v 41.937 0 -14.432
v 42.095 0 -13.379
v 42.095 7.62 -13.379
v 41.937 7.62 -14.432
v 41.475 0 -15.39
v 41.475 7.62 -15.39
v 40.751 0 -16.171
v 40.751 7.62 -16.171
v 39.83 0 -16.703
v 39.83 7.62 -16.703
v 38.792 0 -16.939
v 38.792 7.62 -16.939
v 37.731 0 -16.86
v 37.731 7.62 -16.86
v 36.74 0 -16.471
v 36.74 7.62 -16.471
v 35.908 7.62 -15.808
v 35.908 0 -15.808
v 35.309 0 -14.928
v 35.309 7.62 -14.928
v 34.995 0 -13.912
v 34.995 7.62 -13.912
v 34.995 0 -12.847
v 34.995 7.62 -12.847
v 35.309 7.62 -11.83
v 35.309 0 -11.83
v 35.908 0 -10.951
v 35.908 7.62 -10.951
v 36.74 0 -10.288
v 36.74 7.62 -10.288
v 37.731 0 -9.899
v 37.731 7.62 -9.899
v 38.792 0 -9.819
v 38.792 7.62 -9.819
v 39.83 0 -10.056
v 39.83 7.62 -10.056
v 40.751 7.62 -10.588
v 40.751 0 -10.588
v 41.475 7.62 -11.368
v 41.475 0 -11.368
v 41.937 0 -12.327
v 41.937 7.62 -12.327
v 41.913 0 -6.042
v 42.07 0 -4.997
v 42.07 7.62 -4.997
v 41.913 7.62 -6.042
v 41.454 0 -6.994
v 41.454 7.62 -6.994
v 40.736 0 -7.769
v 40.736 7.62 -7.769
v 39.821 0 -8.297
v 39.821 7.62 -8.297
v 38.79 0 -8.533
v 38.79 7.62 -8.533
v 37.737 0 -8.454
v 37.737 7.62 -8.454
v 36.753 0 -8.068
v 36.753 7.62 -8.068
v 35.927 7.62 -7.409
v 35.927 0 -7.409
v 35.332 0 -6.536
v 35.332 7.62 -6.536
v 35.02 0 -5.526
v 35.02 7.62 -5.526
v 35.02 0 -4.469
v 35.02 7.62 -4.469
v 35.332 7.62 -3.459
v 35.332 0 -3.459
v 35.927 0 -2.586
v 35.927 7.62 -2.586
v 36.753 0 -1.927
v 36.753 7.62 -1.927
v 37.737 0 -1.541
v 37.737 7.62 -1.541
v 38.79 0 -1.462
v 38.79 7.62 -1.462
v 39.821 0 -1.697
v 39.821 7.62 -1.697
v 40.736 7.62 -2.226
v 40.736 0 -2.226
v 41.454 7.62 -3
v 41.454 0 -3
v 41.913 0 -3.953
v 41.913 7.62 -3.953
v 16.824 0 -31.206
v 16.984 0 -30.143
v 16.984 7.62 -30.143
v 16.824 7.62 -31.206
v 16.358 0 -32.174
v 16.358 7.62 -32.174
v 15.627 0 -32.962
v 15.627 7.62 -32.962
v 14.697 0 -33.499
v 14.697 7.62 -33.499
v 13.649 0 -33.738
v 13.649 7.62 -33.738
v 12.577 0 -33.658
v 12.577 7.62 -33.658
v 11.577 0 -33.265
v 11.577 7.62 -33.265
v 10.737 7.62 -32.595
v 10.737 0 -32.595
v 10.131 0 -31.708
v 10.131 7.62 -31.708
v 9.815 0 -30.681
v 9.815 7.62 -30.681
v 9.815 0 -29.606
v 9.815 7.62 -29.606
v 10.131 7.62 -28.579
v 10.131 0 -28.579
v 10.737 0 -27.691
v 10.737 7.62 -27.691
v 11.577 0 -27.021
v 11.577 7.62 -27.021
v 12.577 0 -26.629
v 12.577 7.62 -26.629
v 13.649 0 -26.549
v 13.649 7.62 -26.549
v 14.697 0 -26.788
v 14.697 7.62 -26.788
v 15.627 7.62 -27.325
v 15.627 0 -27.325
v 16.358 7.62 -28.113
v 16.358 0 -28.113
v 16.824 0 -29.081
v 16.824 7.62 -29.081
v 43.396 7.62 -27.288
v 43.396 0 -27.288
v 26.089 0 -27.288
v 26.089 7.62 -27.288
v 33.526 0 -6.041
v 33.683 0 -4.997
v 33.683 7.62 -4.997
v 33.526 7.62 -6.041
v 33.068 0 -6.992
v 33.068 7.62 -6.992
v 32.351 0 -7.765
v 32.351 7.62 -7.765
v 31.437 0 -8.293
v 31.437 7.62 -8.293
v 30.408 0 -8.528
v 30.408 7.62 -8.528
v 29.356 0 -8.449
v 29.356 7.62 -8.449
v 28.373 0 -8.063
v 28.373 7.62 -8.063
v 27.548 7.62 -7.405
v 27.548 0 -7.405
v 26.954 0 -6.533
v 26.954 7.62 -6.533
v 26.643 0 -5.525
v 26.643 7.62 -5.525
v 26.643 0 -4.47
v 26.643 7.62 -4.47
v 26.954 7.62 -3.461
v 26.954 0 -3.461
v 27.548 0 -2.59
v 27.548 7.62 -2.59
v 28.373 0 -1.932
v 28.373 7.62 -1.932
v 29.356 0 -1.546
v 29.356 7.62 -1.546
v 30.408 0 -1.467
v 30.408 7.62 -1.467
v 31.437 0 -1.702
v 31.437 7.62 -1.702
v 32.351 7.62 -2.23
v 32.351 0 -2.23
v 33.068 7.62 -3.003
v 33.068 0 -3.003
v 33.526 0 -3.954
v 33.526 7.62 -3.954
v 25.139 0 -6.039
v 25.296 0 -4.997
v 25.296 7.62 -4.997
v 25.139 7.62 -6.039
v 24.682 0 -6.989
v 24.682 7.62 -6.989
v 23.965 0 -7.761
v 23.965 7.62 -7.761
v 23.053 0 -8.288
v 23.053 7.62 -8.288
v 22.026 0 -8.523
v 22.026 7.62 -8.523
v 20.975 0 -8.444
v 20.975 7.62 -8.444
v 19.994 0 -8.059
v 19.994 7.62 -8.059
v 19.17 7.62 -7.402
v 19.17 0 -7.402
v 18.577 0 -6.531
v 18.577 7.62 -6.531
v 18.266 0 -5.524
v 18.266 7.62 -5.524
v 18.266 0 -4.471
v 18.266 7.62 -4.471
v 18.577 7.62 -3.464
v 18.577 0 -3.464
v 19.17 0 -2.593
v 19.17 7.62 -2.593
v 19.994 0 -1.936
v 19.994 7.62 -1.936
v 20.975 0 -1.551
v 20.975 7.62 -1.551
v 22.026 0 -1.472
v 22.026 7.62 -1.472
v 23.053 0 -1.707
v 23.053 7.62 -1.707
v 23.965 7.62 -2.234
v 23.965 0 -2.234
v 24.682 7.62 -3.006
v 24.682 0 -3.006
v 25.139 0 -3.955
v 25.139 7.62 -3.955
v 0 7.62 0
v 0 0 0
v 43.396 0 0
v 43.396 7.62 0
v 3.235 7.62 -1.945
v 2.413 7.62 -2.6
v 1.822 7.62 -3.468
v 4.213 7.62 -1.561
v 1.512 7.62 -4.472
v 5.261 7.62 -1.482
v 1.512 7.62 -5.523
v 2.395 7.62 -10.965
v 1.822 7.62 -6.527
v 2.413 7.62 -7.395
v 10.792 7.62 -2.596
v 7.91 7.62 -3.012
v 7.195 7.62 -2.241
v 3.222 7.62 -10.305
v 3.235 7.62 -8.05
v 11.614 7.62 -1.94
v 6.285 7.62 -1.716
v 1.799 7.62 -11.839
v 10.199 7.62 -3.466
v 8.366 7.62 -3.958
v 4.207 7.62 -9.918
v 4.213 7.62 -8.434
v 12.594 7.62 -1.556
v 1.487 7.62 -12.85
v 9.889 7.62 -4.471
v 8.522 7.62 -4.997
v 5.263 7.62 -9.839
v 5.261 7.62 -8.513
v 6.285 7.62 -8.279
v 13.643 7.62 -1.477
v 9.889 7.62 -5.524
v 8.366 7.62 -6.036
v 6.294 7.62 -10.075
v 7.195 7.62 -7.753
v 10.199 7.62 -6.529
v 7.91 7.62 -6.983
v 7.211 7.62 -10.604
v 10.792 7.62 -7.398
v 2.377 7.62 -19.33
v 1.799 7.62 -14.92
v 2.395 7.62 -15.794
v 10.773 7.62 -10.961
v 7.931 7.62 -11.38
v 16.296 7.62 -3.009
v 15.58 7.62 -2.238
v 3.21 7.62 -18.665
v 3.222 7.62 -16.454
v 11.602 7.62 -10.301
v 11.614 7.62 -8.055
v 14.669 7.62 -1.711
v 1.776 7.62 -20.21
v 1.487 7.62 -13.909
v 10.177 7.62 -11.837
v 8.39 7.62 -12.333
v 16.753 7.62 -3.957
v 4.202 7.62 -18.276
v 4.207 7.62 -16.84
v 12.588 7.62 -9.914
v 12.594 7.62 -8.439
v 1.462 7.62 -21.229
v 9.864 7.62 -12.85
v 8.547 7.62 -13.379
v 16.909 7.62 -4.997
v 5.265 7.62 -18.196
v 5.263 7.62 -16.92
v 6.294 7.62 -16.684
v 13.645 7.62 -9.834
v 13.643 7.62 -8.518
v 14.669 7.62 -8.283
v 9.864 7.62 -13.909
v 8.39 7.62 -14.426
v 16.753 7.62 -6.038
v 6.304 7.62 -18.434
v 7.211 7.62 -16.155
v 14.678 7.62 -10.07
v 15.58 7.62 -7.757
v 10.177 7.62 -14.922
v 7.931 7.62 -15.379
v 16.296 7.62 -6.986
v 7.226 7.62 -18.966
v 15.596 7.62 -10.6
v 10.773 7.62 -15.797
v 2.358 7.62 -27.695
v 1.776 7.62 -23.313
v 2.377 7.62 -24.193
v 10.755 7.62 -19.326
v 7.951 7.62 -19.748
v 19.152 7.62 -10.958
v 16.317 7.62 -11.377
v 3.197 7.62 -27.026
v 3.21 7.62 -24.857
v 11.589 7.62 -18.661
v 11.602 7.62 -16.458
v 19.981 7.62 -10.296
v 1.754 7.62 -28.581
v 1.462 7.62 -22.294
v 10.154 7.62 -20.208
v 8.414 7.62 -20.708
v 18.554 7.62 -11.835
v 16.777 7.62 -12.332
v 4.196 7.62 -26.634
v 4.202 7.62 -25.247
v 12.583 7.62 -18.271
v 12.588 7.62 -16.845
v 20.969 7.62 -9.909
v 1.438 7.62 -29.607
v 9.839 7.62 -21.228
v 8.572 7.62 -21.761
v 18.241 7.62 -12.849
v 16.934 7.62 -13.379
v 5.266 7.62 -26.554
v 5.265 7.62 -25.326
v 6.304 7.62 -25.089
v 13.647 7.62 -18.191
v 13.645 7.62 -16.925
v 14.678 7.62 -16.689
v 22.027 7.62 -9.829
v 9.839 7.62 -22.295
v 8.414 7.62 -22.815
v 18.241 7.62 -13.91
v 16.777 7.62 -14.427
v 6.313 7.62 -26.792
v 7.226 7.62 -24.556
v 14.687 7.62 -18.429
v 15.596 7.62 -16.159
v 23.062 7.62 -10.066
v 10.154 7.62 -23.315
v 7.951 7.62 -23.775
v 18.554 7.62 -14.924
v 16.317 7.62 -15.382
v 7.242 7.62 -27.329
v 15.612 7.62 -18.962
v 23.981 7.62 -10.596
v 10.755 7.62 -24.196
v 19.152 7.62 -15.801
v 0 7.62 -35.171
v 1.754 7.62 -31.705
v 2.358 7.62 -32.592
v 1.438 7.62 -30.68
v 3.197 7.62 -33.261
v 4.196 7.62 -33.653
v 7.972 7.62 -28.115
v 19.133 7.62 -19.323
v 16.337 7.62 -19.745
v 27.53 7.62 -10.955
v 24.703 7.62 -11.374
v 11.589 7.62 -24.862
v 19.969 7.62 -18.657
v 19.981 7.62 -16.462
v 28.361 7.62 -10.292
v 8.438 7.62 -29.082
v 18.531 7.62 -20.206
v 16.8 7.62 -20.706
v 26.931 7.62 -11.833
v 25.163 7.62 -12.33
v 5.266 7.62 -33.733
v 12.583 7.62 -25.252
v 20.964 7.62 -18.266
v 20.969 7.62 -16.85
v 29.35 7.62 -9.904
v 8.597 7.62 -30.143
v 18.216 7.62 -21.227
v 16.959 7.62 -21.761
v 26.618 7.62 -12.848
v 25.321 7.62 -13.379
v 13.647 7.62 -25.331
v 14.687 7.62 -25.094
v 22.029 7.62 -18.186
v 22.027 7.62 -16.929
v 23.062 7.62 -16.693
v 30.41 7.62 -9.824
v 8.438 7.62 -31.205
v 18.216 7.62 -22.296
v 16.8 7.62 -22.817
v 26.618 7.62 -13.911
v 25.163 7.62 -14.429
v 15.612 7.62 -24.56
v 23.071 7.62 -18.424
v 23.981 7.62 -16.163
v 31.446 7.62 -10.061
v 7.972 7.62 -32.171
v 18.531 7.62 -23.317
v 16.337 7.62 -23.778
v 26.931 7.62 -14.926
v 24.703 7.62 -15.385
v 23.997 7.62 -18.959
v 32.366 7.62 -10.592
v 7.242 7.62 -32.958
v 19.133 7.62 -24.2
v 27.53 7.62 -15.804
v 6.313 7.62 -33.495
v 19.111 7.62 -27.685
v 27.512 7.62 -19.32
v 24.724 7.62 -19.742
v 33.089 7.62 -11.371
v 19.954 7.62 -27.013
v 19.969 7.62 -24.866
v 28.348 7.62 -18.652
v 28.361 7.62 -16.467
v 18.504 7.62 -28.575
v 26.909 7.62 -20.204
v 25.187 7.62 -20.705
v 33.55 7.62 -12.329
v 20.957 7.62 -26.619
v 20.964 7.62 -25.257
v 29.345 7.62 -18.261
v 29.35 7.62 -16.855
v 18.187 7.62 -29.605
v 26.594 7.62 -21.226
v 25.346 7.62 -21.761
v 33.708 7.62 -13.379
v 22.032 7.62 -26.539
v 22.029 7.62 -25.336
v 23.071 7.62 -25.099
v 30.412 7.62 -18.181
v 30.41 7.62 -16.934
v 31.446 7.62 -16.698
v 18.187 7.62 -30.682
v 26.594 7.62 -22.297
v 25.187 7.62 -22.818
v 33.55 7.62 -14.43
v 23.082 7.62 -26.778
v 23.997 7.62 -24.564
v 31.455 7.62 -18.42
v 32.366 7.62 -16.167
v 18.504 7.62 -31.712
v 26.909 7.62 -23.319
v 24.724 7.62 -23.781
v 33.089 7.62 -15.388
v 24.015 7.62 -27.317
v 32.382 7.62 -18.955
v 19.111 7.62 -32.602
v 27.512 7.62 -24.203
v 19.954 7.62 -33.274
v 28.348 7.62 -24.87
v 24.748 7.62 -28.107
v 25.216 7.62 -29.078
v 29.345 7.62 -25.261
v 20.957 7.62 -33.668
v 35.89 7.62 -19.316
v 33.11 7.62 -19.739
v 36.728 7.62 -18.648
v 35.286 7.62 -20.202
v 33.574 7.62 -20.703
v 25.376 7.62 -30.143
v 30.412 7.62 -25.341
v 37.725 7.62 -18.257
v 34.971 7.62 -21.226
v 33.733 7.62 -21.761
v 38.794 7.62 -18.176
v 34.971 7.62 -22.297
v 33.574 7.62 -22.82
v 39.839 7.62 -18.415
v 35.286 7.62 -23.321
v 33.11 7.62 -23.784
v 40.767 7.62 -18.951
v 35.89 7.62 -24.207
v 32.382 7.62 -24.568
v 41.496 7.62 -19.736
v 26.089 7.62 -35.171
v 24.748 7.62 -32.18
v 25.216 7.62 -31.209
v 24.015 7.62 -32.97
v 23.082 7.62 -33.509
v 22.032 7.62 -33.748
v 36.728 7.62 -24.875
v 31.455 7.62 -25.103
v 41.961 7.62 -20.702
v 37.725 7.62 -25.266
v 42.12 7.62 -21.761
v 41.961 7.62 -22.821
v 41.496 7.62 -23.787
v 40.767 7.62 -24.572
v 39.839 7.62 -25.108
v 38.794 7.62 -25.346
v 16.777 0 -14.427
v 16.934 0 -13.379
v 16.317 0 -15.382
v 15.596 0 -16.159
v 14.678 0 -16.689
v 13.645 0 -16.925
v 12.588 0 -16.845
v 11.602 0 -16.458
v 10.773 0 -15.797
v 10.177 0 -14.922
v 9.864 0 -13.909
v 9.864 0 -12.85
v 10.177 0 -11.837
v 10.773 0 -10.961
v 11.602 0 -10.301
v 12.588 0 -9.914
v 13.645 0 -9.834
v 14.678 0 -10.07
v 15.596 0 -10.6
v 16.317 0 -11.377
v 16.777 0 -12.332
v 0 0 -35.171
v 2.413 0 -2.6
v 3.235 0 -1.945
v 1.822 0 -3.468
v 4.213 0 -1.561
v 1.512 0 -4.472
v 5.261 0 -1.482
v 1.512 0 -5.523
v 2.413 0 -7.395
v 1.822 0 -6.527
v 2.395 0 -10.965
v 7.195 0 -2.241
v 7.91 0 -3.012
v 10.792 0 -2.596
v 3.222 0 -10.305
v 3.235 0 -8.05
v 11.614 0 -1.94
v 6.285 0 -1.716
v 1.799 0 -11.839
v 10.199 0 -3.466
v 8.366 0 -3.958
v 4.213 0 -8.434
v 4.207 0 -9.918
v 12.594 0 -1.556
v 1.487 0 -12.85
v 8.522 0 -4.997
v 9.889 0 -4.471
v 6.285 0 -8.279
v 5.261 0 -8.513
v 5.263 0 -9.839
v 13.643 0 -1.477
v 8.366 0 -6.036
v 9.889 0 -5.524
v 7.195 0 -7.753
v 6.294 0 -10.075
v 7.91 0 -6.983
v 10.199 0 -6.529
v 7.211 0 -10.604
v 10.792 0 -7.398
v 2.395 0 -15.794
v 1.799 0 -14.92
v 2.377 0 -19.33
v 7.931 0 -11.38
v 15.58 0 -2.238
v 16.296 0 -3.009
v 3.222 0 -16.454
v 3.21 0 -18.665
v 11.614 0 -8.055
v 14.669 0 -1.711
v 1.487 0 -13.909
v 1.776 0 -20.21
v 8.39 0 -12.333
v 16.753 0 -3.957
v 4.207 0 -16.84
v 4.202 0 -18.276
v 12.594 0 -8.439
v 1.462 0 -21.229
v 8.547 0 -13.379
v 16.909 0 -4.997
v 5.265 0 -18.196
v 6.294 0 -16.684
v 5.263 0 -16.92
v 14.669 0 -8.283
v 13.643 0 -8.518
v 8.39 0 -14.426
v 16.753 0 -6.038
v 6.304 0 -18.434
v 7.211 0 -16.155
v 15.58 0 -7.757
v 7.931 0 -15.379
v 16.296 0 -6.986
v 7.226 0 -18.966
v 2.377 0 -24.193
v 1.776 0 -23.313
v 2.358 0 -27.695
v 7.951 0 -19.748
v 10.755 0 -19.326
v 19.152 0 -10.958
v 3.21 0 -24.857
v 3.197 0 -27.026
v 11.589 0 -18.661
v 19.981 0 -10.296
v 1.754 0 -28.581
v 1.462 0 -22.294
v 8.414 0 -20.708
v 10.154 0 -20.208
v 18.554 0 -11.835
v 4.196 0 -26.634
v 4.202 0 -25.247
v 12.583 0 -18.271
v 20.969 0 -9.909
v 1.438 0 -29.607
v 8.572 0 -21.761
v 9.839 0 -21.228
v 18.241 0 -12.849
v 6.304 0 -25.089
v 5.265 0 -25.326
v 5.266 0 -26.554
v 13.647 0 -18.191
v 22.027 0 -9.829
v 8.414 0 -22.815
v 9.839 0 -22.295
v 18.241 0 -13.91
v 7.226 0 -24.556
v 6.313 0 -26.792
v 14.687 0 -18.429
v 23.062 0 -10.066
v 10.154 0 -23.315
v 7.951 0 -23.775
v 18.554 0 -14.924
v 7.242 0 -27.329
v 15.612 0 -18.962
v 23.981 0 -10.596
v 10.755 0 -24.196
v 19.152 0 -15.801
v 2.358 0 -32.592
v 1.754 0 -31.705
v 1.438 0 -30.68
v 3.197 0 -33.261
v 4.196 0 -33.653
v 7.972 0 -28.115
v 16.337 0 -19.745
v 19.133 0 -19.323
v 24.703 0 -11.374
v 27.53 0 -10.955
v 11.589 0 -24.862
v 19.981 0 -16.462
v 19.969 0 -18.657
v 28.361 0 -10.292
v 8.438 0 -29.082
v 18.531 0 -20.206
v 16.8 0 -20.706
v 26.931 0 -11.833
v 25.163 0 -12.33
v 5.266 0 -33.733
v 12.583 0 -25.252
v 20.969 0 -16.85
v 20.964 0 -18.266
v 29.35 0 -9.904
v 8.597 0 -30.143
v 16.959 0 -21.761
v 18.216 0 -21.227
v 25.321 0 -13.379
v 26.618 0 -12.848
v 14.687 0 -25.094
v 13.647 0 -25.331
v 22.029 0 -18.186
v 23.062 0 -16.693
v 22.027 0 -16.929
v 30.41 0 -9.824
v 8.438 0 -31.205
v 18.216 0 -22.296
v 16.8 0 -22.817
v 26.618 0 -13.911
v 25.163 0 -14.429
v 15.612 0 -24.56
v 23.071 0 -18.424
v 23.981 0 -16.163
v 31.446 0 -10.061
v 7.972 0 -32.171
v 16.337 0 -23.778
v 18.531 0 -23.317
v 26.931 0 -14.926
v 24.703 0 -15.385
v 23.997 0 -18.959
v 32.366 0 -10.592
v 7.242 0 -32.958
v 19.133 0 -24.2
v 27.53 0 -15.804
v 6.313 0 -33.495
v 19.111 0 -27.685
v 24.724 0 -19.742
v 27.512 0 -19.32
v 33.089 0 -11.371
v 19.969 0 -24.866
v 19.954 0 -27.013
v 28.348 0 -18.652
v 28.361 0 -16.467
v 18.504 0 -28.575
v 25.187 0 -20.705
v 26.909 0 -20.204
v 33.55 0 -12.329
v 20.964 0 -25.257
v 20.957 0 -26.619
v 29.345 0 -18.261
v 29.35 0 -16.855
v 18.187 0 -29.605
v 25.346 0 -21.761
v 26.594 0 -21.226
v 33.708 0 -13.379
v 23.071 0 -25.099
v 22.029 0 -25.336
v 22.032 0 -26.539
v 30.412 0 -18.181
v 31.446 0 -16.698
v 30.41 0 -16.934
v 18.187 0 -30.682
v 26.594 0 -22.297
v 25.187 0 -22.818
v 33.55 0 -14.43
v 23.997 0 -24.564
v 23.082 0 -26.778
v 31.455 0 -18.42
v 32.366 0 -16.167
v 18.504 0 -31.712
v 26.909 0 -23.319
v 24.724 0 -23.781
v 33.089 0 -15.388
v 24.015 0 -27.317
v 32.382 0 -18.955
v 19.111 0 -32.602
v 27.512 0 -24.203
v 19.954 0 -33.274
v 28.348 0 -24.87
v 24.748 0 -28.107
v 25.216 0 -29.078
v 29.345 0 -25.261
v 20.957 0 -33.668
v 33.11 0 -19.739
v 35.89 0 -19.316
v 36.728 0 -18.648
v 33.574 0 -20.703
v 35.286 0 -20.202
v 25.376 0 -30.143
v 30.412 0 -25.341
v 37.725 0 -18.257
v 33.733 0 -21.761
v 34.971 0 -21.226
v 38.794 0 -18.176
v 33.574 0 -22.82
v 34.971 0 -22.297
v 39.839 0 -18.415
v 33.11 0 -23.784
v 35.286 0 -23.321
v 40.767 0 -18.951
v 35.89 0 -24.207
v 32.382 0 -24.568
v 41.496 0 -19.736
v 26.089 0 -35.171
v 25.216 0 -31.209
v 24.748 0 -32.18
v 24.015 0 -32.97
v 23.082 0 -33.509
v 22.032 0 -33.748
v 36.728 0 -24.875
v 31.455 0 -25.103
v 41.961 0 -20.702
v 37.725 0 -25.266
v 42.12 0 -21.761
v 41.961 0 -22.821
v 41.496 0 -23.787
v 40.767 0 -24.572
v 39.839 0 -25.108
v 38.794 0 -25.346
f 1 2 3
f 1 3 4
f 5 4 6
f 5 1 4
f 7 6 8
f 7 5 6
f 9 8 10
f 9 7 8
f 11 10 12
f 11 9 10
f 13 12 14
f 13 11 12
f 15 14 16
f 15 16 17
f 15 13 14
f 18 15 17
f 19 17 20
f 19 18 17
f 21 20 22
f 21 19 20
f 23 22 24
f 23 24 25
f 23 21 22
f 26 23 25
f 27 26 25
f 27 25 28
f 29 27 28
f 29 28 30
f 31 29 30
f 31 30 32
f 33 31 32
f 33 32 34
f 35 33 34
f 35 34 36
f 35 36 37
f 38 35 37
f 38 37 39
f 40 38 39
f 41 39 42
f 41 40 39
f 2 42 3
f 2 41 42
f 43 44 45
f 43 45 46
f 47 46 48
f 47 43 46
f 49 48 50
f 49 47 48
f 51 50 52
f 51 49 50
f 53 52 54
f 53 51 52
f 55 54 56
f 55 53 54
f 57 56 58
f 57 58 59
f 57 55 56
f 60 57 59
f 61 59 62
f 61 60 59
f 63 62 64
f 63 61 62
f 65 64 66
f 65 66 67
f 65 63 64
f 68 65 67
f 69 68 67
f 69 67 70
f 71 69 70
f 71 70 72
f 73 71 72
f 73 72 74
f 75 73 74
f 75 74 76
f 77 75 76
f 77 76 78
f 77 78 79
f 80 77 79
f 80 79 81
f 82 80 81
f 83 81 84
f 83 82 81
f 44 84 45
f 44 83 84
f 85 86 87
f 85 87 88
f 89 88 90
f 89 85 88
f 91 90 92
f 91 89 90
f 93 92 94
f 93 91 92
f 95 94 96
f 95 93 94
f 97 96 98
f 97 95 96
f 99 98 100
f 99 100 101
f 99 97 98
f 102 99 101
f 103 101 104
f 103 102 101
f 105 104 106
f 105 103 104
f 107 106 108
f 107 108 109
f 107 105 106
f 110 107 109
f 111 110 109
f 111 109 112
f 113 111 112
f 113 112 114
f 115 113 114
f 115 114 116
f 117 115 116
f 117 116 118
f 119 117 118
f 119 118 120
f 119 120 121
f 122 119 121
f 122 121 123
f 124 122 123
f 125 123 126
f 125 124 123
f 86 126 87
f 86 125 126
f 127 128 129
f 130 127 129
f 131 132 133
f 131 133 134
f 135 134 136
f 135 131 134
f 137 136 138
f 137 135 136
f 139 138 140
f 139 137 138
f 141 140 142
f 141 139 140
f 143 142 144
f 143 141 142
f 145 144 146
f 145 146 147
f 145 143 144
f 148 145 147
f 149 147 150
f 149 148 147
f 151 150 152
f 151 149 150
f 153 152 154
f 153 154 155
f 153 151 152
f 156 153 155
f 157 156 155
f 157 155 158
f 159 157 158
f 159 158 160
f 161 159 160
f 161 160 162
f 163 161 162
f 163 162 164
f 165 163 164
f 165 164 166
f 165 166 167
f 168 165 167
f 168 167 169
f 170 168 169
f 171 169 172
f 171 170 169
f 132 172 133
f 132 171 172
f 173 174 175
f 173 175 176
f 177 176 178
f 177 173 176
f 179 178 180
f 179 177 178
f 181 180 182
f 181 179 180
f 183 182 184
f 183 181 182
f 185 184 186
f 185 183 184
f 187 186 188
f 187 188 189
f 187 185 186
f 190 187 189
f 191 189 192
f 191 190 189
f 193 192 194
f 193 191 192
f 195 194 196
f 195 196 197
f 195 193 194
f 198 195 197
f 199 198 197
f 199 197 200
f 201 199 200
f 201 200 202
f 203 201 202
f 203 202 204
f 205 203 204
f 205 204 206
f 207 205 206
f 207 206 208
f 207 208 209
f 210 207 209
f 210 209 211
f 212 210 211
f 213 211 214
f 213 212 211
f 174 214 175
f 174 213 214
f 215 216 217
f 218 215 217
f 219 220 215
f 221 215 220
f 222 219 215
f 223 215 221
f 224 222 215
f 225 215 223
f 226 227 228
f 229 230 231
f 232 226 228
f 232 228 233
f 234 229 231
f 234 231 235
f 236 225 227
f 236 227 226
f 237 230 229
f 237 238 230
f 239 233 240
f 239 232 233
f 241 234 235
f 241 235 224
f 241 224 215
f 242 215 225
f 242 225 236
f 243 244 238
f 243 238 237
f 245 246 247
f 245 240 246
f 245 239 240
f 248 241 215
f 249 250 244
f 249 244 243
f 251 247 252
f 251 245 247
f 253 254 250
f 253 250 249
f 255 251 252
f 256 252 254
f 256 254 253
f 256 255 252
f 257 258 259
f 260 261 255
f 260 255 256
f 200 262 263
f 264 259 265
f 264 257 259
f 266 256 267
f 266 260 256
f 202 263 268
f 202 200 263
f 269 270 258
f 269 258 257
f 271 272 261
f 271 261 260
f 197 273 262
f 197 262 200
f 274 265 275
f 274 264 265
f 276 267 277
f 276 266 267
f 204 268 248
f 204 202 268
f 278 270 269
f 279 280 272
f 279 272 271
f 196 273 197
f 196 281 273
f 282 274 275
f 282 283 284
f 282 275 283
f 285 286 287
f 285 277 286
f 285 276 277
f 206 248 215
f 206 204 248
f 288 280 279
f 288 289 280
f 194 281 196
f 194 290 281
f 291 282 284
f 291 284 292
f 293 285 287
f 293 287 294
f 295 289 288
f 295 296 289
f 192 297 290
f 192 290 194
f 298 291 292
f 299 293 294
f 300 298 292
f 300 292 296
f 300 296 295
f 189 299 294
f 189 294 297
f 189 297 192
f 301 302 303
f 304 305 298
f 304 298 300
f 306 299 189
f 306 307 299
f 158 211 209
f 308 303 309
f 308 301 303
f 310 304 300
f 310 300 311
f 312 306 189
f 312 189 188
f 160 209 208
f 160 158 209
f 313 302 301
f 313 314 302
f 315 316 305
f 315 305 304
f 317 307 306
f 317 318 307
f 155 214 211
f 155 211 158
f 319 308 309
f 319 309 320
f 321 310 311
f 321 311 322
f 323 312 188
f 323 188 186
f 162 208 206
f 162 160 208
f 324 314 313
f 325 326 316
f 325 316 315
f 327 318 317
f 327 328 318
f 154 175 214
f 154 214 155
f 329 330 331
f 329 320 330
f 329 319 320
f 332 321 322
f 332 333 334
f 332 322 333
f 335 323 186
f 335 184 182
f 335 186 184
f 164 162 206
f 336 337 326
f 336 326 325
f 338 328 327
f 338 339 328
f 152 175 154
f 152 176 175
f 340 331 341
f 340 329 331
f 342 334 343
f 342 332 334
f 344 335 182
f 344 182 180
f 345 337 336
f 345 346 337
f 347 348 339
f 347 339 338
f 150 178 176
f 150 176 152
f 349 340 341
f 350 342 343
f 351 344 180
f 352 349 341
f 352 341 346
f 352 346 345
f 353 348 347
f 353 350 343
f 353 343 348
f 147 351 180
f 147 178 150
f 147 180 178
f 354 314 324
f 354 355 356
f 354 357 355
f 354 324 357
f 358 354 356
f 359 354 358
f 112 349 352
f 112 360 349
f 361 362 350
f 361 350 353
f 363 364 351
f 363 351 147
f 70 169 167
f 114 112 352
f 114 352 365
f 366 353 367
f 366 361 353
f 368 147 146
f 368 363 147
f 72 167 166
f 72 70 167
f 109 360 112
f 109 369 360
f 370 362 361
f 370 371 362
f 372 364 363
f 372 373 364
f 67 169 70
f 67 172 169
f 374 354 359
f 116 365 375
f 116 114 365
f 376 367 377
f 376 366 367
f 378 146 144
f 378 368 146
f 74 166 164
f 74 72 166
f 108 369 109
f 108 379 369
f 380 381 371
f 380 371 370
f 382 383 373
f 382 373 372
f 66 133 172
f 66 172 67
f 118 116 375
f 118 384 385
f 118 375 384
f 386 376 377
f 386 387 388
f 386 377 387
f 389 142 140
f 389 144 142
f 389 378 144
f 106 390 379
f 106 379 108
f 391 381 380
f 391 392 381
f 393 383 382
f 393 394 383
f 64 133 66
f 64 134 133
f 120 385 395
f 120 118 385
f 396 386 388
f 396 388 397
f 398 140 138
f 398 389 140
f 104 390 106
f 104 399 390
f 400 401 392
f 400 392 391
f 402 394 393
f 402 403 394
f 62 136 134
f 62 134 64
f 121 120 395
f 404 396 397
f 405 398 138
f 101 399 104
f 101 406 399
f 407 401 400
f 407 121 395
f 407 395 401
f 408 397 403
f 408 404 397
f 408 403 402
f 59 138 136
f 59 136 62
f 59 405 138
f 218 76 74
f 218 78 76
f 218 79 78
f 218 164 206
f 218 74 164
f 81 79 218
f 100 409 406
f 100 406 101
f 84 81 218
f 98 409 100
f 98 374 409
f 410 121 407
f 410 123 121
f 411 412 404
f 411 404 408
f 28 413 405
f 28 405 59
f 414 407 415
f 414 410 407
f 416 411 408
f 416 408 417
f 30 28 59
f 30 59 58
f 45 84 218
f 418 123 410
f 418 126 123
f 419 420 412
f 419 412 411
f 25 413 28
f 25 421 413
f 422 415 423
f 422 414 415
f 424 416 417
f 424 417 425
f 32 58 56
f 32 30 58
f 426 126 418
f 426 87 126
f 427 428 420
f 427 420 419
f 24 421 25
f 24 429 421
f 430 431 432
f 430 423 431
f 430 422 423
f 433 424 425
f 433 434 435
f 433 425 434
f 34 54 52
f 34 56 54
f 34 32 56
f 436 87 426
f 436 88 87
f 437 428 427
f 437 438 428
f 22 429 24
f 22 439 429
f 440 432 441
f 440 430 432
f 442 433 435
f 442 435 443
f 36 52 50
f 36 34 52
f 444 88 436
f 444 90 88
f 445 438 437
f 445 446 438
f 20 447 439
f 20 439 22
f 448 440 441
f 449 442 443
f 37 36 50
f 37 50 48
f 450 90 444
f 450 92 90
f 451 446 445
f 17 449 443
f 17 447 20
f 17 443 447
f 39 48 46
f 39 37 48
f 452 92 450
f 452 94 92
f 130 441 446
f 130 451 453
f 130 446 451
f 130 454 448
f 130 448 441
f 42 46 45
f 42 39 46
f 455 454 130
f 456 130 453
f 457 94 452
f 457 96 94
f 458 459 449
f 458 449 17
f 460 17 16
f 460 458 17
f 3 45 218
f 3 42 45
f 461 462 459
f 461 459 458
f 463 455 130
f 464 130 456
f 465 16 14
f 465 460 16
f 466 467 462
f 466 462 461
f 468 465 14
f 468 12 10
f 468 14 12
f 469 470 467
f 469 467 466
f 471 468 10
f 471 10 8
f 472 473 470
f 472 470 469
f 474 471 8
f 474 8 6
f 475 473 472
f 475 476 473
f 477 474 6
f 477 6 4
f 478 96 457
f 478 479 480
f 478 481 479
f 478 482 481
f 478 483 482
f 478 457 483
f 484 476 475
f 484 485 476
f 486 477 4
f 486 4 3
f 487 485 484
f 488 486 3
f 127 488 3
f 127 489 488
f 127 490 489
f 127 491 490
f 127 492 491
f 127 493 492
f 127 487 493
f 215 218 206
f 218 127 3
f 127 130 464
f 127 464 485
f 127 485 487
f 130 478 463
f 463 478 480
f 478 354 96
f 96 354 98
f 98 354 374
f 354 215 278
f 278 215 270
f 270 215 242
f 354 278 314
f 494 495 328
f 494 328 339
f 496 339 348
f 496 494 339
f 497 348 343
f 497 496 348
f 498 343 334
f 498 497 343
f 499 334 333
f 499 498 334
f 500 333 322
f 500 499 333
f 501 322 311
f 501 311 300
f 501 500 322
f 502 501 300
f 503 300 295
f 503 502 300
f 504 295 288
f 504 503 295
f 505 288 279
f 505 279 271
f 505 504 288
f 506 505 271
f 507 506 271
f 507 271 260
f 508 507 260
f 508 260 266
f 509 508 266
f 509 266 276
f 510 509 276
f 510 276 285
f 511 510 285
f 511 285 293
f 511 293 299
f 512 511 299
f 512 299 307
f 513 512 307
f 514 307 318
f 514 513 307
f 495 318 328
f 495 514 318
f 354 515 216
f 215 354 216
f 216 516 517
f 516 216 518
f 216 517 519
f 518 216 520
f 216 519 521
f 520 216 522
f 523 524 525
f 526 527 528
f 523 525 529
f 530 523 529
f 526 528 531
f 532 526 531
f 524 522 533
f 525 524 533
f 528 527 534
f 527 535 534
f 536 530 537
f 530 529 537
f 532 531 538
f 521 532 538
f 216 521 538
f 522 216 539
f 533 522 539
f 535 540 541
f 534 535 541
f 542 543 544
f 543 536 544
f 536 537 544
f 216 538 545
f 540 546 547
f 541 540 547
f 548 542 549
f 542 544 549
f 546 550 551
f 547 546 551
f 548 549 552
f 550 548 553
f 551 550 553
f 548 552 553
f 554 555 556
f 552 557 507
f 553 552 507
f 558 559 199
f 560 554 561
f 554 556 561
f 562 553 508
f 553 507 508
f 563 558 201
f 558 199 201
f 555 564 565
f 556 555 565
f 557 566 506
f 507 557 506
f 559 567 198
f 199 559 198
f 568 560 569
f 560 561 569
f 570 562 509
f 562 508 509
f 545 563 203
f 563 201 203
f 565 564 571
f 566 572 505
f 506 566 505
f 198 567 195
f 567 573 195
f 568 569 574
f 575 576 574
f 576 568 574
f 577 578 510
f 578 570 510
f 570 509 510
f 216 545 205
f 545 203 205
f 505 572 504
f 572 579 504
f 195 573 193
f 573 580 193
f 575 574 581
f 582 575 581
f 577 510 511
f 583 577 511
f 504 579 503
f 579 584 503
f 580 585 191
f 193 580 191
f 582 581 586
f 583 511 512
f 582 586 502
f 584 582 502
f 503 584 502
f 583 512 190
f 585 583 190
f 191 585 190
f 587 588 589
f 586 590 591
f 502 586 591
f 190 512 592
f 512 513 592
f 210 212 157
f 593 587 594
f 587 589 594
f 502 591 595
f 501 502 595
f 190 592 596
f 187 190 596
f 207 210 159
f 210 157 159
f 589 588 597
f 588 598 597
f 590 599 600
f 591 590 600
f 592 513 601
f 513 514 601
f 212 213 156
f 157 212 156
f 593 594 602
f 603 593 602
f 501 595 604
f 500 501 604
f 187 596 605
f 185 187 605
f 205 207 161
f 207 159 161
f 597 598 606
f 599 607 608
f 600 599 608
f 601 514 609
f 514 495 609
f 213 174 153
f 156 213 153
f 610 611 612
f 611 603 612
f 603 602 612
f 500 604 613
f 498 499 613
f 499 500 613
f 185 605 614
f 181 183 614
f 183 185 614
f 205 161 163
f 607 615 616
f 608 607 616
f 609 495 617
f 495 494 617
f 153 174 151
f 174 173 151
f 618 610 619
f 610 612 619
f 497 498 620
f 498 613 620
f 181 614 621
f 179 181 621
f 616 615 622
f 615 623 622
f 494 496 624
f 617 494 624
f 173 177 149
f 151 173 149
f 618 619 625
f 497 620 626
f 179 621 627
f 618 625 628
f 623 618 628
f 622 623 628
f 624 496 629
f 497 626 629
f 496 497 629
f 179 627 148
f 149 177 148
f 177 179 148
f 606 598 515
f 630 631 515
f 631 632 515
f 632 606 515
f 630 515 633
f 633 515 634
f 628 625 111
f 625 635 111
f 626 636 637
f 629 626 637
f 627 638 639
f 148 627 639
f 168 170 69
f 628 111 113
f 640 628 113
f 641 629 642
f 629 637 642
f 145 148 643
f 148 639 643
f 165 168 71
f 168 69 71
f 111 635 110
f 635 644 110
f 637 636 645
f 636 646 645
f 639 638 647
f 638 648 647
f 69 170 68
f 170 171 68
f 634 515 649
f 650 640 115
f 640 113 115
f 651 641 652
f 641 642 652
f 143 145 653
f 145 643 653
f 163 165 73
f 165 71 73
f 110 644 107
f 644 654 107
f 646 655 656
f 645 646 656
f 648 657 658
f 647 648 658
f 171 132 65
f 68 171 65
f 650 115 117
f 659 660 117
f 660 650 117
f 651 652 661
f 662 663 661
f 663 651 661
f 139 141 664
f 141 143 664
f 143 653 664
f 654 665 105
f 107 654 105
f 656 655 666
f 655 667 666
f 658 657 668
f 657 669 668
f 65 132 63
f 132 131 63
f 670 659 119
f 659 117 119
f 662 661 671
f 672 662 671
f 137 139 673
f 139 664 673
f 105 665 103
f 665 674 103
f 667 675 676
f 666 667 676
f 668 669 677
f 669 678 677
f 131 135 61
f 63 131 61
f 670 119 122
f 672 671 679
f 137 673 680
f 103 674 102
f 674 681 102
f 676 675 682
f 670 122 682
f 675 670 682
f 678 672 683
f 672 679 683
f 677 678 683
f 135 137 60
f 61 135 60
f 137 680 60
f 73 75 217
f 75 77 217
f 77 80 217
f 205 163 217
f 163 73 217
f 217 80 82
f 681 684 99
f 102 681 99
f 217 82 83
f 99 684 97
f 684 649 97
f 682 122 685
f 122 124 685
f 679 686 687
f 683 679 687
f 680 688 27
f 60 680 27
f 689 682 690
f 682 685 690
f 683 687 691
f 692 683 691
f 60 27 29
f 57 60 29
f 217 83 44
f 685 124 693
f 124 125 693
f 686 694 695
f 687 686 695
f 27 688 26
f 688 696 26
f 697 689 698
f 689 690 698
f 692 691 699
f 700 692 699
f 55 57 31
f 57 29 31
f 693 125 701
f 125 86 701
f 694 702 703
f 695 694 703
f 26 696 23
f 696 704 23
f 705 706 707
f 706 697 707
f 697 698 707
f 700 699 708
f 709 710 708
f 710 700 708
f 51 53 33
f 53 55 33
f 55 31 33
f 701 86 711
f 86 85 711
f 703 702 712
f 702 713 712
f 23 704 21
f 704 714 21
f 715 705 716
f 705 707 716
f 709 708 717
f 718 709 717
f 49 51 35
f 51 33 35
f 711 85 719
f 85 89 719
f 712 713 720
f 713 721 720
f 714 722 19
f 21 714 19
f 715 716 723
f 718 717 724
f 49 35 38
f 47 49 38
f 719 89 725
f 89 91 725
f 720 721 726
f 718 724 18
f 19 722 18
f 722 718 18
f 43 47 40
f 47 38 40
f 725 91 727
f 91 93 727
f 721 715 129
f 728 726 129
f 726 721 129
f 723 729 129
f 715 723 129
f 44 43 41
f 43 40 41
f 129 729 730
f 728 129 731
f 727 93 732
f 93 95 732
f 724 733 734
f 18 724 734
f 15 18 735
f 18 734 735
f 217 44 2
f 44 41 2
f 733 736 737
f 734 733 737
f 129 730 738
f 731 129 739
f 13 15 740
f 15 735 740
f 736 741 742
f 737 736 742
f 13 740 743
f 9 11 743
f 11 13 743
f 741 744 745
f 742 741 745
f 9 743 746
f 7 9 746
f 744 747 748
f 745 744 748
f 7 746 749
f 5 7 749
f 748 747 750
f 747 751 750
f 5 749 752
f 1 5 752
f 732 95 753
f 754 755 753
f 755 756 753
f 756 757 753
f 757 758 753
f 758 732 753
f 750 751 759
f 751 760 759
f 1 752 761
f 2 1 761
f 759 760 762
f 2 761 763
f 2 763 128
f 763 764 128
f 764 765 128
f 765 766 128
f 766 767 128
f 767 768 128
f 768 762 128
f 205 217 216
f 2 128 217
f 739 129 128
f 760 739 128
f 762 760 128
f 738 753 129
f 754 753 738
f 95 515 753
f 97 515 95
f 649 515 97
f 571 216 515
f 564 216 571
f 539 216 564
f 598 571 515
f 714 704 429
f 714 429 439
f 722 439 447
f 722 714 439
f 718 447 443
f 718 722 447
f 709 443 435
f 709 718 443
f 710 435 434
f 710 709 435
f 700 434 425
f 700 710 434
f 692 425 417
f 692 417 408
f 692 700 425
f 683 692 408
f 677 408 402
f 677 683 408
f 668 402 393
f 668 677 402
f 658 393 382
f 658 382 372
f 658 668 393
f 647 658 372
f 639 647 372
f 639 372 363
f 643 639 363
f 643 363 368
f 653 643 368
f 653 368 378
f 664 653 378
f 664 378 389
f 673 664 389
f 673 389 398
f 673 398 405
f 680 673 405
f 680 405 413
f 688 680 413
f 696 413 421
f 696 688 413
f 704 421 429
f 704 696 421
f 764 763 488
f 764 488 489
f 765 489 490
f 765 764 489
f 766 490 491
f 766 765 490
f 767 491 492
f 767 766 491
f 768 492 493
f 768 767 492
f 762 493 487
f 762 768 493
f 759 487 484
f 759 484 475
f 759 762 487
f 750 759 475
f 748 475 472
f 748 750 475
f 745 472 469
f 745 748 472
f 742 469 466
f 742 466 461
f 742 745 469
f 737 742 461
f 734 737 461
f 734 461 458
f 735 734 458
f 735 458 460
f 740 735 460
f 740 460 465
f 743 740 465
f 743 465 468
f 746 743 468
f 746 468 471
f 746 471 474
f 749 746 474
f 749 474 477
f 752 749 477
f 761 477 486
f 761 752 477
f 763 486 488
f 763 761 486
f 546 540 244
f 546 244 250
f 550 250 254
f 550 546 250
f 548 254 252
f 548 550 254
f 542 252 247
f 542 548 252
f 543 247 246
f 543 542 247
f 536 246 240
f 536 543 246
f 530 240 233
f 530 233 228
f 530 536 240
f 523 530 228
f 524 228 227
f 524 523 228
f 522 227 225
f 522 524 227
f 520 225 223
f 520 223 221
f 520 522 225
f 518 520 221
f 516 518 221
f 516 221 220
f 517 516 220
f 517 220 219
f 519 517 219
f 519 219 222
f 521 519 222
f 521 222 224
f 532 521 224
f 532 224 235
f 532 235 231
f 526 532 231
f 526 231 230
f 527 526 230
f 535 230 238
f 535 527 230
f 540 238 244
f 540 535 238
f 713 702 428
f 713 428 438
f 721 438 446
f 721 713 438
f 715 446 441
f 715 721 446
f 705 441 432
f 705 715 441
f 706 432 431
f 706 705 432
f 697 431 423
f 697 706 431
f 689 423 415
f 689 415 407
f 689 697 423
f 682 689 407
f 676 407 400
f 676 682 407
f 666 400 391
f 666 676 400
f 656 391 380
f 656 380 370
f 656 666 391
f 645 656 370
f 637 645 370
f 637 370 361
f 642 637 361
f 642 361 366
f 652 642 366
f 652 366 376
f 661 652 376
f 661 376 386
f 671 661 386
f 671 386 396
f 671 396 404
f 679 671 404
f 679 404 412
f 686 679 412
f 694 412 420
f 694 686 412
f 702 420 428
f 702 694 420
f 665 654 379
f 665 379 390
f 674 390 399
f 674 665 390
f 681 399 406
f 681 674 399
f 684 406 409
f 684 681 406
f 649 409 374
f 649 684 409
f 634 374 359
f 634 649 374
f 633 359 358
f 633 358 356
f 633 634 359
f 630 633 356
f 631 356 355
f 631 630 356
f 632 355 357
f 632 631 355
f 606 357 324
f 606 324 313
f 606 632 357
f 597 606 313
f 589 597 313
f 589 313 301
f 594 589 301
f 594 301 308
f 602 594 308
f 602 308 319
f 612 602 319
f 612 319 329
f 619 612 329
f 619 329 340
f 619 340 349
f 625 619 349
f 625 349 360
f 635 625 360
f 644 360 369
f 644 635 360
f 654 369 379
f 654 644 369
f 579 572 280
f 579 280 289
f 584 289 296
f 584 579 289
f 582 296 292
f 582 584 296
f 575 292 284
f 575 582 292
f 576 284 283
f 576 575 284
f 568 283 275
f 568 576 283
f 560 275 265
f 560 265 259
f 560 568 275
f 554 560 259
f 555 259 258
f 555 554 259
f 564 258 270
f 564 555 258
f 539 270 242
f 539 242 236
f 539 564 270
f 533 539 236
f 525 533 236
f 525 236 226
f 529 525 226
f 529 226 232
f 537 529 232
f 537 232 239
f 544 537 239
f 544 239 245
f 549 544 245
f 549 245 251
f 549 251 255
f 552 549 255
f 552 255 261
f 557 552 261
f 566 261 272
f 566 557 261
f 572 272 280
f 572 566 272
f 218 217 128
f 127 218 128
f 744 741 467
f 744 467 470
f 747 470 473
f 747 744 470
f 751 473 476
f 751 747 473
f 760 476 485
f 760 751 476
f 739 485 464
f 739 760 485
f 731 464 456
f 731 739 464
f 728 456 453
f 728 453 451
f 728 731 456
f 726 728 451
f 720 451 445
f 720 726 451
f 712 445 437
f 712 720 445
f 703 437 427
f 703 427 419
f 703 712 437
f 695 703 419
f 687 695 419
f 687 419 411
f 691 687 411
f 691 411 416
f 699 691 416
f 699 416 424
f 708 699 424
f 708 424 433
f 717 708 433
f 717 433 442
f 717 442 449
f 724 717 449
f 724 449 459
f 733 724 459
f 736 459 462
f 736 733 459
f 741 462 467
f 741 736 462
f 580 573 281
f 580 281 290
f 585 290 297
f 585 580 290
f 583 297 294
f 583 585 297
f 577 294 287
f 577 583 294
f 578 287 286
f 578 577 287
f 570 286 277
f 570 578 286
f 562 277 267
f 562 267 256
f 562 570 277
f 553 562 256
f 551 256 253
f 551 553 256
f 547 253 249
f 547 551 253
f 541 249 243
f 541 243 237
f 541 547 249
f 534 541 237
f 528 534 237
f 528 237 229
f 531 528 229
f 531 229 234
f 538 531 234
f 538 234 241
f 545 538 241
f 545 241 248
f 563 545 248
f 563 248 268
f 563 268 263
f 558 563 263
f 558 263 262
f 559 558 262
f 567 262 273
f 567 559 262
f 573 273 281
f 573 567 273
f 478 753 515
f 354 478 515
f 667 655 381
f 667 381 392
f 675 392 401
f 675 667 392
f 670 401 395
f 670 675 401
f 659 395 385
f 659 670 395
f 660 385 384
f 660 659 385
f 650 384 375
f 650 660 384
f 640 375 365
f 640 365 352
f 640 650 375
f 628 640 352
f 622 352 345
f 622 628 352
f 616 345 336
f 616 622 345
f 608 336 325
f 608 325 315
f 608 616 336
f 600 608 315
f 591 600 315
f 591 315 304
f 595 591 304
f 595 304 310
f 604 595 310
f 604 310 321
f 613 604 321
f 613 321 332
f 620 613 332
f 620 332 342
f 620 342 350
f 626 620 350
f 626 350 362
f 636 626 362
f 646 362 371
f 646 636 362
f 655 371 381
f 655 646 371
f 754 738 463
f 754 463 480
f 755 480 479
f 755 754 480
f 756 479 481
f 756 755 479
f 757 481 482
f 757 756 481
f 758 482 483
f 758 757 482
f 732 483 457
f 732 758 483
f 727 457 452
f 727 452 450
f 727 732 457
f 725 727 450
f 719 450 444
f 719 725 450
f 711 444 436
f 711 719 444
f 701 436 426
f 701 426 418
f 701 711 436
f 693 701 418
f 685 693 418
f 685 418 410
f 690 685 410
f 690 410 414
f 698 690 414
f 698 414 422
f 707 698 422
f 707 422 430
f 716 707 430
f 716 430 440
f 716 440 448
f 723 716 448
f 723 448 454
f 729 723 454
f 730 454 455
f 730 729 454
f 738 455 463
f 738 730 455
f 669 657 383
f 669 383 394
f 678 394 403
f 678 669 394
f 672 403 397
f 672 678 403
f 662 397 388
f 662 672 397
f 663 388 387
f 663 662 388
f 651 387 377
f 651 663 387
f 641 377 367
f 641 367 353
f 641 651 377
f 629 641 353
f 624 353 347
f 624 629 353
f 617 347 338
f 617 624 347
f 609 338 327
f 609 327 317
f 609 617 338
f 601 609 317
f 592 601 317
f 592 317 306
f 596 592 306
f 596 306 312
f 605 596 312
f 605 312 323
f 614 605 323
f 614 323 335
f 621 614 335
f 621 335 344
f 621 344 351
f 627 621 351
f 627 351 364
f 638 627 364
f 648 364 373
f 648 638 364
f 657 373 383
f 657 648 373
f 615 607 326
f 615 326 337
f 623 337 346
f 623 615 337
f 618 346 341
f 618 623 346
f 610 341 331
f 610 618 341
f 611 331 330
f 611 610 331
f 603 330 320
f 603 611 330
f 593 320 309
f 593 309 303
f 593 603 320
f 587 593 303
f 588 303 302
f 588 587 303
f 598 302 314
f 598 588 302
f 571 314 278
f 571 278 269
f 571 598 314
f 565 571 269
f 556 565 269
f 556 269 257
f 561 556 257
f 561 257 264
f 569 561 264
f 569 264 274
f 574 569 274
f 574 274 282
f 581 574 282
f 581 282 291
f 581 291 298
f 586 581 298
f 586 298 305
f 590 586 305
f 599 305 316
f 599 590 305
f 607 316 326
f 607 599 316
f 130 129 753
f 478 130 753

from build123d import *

# Parameters (mm, degrees)
SKETCH1_R           = 3.525
SKETCH1_R_2         = 3.53
SKETCH1_R_3         = 3.535
SKETCH1_R_4         = 3.54
SKETCH1_R_5         = 3.545
SKETCH1_R_6         = 3.555
SKETCH1_R_7         = 3.56
SKETCH1_R_8         = 3.565
SKETCH1_R_9         = 3.57
SKETCH1_R_10        = 3.58
SKETCH1_R_11        = 3.585
SKETCH1_R_12        = 3.59
SKETCH1_R_13        = 3.595
SKETCH1_R_14        = 3.605
SKETCH1_R_15        = 3.615
SKETCH1_R_16        = 3.55
SKETCH1_R_17        = 3.575
SKETCH1_R_18        = 3.6
BOSS_EXTRUDE1_DEPTH = 7.62


with BuildPart() as part:
    # Sketch1 → Boss-Extrude1 (new body)
    with BuildSketch(Plane(origin=(0, 0, 0), x_dir=(1, 0, 0), z_dir=(0, 1, 0))):
        Polygon((0, 0), (43.396152207, 0), (43.396152207, 27.288237387), (26.088694952, 27.288237387), (26.088694952, 35.171413764), (0, 35.171413764), align=None)
        with Locations((4.997445859, 4.997445859)):
            Circle(SKETCH1_R, mode=Mode.SUBTRACT)
        with Locations((13.379445859, 4.997445859)):
            Circle(SKETCH1_R_2, mode=Mode.SUBTRACT)
        with Locations((21.761445859, 4.997445859)):
            Circle(SKETCH1_R_3, mode=Mode.SUBTRACT)
        with Locations((30.143445859, 4.997445859)):
            Circle(SKETCH1_R_4, mode=Mode.SUBTRACT)
        with Locations((38.525445859, 4.997445859)):
            Circle(SKETCH1_R_5, mode=Mode.SUBTRACT)
        with Locations((13.379445859, 13.379445859)):
            Circle(SKETCH1_R_6, mode=Mode.SUBTRACT)
        with Locations((21.761445859, 13.379445859)):
            Circle(SKETCH1_R_7, mode=Mode.SUBTRACT)
        with Locations((30.143445859, 13.379445859)):
            Circle(SKETCH1_R_8, mode=Mode.SUBTRACT)
        with Locations((38.525445859, 13.379445859)):
            Circle(SKETCH1_R_9, mode=Mode.SUBTRACT)
        with Locations((13.379445859, 21.761445859)):
            Circle(SKETCH1_R_10, mode=Mode.SUBTRACT)
        with Locations((21.761445859, 21.761445859)):
            Circle(SKETCH1_R_11, mode=Mode.SUBTRACT)
        with Locations((30.143445859, 21.761445859)):
            Circle(SKETCH1_R_12, mode=Mode.SUBTRACT)
        with Locations((38.525445859, 21.761445859)):
            Circle(SKETCH1_R_13, mode=Mode.SUBTRACT)
        with Locations((13.379445859, 30.143445859)):
            Circle(SKETCH1_R_14, mode=Mode.SUBTRACT)
        with Locations((21.761445859, 30.143445859)):
            Circle(SKETCH1_R_15, mode=Mode.SUBTRACT)
        with Locations((4.997445859, 13.379445859)):
            Circle(SKETCH1_R_16, mode=Mode.SUBTRACT)
        with Locations((4.997445859, 21.761445859)):
            Circle(SKETCH1_R_17, mode=Mode.SUBTRACT)
        with Locations((4.997445859, 30.143445859)):
            Circle(SKETCH1_R_18, mode=Mode.SUBTRACT)
    extrude(amount=BOSS_EXTRUDE1_DEPTH)


solid = part.part
